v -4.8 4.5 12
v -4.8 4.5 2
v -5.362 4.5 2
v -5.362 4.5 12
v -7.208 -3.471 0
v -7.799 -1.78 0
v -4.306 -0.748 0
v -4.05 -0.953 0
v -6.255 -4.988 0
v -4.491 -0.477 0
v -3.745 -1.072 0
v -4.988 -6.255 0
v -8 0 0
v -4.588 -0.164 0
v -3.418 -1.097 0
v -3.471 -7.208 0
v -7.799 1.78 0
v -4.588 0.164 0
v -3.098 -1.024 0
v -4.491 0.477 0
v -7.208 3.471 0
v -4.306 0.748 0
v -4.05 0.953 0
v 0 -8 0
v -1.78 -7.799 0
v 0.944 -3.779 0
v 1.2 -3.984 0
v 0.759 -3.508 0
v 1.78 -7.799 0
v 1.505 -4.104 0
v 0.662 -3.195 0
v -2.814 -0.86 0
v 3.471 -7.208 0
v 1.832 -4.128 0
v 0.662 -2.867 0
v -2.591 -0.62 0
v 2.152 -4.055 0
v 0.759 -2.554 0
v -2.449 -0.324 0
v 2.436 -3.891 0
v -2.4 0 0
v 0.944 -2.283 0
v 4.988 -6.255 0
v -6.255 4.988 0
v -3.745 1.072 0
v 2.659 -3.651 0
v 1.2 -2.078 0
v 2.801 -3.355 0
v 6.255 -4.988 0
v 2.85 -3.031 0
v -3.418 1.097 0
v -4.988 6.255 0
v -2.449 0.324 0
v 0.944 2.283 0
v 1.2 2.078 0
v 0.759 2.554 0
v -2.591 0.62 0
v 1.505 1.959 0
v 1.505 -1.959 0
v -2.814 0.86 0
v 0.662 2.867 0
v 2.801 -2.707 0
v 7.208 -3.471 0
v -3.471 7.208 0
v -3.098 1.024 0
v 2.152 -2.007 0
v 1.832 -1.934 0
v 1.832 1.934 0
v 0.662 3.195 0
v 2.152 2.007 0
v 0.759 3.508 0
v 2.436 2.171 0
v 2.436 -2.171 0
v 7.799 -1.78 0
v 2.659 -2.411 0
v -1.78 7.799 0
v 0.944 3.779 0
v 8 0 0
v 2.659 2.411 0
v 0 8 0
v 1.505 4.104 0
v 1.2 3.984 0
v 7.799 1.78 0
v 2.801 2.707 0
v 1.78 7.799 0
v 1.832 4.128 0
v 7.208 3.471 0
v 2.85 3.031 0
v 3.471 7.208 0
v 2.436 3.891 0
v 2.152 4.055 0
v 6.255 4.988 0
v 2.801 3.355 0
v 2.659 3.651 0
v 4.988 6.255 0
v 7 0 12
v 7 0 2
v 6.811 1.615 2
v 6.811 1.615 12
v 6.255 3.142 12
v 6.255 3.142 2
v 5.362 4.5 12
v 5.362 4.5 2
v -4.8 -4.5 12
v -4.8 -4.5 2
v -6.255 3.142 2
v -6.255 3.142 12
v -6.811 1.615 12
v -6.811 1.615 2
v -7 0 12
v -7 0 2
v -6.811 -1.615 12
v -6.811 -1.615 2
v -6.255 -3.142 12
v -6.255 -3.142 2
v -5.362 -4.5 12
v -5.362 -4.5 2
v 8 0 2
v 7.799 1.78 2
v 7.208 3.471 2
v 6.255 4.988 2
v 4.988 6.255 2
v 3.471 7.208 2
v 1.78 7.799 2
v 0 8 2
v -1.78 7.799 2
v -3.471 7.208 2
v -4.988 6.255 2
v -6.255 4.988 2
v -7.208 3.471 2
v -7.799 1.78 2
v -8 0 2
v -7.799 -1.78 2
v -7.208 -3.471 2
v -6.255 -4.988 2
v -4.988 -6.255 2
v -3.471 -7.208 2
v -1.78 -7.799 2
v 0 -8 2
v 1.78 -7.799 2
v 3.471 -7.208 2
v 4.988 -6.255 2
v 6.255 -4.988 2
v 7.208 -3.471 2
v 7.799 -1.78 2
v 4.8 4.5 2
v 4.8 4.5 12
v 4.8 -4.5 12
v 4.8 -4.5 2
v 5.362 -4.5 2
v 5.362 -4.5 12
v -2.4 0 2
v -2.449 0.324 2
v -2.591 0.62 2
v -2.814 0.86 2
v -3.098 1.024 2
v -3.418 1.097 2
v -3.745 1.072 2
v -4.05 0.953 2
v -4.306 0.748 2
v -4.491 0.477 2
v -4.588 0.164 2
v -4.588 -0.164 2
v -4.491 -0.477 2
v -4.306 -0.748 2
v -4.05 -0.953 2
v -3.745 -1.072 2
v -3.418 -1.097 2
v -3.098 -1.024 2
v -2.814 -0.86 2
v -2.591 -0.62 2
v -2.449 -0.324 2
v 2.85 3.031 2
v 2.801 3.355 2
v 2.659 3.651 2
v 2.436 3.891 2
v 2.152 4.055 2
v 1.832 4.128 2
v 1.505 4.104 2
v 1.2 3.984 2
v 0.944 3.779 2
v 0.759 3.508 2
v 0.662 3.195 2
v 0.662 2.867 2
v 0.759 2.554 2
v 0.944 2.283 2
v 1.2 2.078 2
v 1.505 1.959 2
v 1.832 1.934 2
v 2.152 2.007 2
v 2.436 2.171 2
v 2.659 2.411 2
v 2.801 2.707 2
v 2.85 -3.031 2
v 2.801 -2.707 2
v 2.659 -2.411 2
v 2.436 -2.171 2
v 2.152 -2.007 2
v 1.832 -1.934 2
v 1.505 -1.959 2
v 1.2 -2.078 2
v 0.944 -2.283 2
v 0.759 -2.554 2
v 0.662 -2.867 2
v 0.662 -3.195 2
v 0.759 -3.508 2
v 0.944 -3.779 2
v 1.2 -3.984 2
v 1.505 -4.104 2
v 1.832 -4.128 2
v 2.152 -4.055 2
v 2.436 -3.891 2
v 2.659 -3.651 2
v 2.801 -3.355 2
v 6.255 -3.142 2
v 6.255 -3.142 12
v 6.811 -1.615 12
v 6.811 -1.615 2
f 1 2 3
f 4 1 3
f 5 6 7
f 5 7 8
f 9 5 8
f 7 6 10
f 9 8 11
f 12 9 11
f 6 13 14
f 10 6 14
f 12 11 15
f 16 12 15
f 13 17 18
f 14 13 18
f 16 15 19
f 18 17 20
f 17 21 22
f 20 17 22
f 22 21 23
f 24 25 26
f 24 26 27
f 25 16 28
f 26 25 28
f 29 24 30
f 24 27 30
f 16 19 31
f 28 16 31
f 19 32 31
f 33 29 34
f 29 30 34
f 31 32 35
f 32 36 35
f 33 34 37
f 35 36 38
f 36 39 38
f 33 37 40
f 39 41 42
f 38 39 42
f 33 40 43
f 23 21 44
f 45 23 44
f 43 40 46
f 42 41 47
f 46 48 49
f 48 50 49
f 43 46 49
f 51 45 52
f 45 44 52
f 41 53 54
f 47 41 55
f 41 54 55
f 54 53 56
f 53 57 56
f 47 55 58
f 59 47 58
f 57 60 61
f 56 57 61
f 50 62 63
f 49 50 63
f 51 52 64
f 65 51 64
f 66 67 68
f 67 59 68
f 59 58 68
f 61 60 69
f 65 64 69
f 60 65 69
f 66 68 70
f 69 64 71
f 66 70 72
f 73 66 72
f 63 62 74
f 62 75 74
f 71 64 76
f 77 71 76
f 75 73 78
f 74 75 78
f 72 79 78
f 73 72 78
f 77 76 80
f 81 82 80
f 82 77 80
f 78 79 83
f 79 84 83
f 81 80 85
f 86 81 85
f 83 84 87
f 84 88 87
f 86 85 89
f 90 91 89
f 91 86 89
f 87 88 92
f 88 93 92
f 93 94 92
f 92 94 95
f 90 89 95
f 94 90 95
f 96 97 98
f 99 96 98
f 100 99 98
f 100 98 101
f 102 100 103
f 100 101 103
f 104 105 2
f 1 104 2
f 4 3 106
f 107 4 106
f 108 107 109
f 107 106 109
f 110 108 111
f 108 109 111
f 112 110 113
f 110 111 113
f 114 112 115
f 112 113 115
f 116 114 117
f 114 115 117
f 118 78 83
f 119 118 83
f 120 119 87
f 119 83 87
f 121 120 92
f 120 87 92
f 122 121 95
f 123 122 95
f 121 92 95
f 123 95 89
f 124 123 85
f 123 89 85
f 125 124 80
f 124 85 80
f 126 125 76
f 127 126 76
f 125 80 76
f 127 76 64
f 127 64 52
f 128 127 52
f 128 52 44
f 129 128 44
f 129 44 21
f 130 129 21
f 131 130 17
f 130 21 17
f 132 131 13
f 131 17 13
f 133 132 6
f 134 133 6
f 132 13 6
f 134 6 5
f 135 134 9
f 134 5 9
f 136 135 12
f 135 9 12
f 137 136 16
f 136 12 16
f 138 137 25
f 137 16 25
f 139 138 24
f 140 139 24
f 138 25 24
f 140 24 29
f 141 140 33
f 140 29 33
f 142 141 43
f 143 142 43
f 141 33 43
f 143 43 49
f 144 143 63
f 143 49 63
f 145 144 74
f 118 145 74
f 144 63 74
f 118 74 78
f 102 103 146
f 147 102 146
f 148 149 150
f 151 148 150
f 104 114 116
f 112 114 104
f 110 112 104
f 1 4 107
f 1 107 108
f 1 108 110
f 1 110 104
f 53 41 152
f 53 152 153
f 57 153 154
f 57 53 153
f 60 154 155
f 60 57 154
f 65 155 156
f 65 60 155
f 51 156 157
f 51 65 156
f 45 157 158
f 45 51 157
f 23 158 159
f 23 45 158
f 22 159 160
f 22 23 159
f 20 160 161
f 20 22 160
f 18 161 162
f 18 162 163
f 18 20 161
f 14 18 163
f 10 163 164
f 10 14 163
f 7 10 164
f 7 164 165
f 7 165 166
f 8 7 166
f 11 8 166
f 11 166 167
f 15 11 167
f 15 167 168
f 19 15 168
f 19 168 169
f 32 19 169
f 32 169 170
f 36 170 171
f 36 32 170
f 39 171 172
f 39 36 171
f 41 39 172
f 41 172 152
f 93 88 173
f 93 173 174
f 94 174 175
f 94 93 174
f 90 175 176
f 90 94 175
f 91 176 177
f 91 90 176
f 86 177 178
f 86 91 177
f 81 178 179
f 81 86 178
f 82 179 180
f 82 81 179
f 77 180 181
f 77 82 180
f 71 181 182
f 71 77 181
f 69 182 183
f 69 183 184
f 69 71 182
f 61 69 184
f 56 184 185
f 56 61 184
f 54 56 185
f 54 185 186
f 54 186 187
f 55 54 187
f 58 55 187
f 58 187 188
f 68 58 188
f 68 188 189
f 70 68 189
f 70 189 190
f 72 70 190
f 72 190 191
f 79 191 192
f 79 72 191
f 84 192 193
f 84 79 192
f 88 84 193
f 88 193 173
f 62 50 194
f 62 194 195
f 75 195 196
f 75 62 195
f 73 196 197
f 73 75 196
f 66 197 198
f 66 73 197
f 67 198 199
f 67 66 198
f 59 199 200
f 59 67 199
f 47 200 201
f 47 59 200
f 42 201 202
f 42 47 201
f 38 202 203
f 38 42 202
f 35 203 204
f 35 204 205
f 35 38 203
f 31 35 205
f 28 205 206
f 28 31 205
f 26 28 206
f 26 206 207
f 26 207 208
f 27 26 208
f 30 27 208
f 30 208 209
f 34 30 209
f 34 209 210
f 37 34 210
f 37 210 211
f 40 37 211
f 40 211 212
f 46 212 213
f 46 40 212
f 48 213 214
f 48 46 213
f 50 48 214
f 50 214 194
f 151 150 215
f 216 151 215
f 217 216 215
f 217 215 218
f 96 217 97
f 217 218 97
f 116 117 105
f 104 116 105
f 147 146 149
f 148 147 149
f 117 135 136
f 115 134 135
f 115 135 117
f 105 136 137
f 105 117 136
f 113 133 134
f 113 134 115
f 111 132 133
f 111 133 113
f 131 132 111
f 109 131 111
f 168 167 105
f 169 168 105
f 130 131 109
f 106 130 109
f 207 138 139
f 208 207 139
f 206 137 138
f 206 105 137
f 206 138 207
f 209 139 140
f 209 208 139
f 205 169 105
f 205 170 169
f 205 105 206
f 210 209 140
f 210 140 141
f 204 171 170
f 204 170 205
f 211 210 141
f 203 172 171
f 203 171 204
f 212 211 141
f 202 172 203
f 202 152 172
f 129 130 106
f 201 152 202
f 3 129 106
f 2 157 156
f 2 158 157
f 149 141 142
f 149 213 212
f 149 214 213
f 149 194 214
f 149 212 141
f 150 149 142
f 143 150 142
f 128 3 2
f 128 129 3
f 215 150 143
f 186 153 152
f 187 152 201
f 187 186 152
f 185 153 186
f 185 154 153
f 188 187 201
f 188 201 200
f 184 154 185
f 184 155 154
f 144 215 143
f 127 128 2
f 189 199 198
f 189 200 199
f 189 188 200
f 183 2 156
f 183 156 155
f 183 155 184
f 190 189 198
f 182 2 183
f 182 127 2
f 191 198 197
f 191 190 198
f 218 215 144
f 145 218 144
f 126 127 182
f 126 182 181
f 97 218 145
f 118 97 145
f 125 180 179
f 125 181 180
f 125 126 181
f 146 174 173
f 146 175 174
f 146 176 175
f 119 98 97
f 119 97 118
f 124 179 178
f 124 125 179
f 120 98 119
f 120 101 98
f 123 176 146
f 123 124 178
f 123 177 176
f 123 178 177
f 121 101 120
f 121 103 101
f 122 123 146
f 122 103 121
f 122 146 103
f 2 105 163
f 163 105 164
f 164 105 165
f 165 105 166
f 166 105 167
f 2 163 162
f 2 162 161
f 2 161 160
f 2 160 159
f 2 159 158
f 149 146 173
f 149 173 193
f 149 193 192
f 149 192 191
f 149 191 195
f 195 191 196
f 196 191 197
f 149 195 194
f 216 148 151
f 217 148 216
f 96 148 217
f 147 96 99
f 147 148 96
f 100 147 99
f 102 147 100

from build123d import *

# Parameters (mm, degrees)
SKETCH1_R           = 8
SKETCH1_R_2         = 1.1
BOSS_EXTRUDE1_DEPTH = 2
BOSS_EXTRUDE2_DEPTH = 10


with BuildPart() as part:
    # Sketch1 → Boss-Extrude1 (new body)
    with BuildSketch(Plane.XY):
        Circle(SKETCH1_R)
        with Locations((-3.5, 0)):
            Circle(SKETCH1_R_2, mode=Mode.SUBTRACT)
        with Locations((1.75, 3.031088913)):
            Circle(SKETCH1_R_2, mode=Mode.SUBTRACT)
        with Locations((1.75, -3.031088913)):
            Circle(SKETCH1_R_2, mode=Mode.SUBTRACT)
    extrude(amount=BOSS_EXTRUDE1_DEPTH)

    # Sketch2 → Boss-Extrude2 (add)
    with BuildSketch(Plane.XY.offset(2)):
        with BuildLine():
            Line((-4.8, 4.5), (-5.361902647, 4.5))
            ThreePointArc((-5.361902647, 4.5), (-7, 0), (-5.361902647, -4.5))
            Line((-5.361902647, -4.5), (-4.8, -4.5))
            Line((-4.8, -4.5), (-4.8, 4.5))
        make_face()
        with BuildLine():
            ThreePointArc((7, 0), (6.577739678, 2.394439545), (5.361902647, 4.5))
            Line((5.361902647, 4.5), (4.8, 4.5))
            Line((4.8, 4.5), (4.8, -4.5))
            Line((4.8, -4.5), (5.361902647, -4.5))
            ThreePointArc((5.361902647, -4.5), (6.577739678, -2.394439545), (7, 0))
        make_face()
    extrude(amount=BOSS_EXTRUDE2_DEPTH)


solid = part.part
